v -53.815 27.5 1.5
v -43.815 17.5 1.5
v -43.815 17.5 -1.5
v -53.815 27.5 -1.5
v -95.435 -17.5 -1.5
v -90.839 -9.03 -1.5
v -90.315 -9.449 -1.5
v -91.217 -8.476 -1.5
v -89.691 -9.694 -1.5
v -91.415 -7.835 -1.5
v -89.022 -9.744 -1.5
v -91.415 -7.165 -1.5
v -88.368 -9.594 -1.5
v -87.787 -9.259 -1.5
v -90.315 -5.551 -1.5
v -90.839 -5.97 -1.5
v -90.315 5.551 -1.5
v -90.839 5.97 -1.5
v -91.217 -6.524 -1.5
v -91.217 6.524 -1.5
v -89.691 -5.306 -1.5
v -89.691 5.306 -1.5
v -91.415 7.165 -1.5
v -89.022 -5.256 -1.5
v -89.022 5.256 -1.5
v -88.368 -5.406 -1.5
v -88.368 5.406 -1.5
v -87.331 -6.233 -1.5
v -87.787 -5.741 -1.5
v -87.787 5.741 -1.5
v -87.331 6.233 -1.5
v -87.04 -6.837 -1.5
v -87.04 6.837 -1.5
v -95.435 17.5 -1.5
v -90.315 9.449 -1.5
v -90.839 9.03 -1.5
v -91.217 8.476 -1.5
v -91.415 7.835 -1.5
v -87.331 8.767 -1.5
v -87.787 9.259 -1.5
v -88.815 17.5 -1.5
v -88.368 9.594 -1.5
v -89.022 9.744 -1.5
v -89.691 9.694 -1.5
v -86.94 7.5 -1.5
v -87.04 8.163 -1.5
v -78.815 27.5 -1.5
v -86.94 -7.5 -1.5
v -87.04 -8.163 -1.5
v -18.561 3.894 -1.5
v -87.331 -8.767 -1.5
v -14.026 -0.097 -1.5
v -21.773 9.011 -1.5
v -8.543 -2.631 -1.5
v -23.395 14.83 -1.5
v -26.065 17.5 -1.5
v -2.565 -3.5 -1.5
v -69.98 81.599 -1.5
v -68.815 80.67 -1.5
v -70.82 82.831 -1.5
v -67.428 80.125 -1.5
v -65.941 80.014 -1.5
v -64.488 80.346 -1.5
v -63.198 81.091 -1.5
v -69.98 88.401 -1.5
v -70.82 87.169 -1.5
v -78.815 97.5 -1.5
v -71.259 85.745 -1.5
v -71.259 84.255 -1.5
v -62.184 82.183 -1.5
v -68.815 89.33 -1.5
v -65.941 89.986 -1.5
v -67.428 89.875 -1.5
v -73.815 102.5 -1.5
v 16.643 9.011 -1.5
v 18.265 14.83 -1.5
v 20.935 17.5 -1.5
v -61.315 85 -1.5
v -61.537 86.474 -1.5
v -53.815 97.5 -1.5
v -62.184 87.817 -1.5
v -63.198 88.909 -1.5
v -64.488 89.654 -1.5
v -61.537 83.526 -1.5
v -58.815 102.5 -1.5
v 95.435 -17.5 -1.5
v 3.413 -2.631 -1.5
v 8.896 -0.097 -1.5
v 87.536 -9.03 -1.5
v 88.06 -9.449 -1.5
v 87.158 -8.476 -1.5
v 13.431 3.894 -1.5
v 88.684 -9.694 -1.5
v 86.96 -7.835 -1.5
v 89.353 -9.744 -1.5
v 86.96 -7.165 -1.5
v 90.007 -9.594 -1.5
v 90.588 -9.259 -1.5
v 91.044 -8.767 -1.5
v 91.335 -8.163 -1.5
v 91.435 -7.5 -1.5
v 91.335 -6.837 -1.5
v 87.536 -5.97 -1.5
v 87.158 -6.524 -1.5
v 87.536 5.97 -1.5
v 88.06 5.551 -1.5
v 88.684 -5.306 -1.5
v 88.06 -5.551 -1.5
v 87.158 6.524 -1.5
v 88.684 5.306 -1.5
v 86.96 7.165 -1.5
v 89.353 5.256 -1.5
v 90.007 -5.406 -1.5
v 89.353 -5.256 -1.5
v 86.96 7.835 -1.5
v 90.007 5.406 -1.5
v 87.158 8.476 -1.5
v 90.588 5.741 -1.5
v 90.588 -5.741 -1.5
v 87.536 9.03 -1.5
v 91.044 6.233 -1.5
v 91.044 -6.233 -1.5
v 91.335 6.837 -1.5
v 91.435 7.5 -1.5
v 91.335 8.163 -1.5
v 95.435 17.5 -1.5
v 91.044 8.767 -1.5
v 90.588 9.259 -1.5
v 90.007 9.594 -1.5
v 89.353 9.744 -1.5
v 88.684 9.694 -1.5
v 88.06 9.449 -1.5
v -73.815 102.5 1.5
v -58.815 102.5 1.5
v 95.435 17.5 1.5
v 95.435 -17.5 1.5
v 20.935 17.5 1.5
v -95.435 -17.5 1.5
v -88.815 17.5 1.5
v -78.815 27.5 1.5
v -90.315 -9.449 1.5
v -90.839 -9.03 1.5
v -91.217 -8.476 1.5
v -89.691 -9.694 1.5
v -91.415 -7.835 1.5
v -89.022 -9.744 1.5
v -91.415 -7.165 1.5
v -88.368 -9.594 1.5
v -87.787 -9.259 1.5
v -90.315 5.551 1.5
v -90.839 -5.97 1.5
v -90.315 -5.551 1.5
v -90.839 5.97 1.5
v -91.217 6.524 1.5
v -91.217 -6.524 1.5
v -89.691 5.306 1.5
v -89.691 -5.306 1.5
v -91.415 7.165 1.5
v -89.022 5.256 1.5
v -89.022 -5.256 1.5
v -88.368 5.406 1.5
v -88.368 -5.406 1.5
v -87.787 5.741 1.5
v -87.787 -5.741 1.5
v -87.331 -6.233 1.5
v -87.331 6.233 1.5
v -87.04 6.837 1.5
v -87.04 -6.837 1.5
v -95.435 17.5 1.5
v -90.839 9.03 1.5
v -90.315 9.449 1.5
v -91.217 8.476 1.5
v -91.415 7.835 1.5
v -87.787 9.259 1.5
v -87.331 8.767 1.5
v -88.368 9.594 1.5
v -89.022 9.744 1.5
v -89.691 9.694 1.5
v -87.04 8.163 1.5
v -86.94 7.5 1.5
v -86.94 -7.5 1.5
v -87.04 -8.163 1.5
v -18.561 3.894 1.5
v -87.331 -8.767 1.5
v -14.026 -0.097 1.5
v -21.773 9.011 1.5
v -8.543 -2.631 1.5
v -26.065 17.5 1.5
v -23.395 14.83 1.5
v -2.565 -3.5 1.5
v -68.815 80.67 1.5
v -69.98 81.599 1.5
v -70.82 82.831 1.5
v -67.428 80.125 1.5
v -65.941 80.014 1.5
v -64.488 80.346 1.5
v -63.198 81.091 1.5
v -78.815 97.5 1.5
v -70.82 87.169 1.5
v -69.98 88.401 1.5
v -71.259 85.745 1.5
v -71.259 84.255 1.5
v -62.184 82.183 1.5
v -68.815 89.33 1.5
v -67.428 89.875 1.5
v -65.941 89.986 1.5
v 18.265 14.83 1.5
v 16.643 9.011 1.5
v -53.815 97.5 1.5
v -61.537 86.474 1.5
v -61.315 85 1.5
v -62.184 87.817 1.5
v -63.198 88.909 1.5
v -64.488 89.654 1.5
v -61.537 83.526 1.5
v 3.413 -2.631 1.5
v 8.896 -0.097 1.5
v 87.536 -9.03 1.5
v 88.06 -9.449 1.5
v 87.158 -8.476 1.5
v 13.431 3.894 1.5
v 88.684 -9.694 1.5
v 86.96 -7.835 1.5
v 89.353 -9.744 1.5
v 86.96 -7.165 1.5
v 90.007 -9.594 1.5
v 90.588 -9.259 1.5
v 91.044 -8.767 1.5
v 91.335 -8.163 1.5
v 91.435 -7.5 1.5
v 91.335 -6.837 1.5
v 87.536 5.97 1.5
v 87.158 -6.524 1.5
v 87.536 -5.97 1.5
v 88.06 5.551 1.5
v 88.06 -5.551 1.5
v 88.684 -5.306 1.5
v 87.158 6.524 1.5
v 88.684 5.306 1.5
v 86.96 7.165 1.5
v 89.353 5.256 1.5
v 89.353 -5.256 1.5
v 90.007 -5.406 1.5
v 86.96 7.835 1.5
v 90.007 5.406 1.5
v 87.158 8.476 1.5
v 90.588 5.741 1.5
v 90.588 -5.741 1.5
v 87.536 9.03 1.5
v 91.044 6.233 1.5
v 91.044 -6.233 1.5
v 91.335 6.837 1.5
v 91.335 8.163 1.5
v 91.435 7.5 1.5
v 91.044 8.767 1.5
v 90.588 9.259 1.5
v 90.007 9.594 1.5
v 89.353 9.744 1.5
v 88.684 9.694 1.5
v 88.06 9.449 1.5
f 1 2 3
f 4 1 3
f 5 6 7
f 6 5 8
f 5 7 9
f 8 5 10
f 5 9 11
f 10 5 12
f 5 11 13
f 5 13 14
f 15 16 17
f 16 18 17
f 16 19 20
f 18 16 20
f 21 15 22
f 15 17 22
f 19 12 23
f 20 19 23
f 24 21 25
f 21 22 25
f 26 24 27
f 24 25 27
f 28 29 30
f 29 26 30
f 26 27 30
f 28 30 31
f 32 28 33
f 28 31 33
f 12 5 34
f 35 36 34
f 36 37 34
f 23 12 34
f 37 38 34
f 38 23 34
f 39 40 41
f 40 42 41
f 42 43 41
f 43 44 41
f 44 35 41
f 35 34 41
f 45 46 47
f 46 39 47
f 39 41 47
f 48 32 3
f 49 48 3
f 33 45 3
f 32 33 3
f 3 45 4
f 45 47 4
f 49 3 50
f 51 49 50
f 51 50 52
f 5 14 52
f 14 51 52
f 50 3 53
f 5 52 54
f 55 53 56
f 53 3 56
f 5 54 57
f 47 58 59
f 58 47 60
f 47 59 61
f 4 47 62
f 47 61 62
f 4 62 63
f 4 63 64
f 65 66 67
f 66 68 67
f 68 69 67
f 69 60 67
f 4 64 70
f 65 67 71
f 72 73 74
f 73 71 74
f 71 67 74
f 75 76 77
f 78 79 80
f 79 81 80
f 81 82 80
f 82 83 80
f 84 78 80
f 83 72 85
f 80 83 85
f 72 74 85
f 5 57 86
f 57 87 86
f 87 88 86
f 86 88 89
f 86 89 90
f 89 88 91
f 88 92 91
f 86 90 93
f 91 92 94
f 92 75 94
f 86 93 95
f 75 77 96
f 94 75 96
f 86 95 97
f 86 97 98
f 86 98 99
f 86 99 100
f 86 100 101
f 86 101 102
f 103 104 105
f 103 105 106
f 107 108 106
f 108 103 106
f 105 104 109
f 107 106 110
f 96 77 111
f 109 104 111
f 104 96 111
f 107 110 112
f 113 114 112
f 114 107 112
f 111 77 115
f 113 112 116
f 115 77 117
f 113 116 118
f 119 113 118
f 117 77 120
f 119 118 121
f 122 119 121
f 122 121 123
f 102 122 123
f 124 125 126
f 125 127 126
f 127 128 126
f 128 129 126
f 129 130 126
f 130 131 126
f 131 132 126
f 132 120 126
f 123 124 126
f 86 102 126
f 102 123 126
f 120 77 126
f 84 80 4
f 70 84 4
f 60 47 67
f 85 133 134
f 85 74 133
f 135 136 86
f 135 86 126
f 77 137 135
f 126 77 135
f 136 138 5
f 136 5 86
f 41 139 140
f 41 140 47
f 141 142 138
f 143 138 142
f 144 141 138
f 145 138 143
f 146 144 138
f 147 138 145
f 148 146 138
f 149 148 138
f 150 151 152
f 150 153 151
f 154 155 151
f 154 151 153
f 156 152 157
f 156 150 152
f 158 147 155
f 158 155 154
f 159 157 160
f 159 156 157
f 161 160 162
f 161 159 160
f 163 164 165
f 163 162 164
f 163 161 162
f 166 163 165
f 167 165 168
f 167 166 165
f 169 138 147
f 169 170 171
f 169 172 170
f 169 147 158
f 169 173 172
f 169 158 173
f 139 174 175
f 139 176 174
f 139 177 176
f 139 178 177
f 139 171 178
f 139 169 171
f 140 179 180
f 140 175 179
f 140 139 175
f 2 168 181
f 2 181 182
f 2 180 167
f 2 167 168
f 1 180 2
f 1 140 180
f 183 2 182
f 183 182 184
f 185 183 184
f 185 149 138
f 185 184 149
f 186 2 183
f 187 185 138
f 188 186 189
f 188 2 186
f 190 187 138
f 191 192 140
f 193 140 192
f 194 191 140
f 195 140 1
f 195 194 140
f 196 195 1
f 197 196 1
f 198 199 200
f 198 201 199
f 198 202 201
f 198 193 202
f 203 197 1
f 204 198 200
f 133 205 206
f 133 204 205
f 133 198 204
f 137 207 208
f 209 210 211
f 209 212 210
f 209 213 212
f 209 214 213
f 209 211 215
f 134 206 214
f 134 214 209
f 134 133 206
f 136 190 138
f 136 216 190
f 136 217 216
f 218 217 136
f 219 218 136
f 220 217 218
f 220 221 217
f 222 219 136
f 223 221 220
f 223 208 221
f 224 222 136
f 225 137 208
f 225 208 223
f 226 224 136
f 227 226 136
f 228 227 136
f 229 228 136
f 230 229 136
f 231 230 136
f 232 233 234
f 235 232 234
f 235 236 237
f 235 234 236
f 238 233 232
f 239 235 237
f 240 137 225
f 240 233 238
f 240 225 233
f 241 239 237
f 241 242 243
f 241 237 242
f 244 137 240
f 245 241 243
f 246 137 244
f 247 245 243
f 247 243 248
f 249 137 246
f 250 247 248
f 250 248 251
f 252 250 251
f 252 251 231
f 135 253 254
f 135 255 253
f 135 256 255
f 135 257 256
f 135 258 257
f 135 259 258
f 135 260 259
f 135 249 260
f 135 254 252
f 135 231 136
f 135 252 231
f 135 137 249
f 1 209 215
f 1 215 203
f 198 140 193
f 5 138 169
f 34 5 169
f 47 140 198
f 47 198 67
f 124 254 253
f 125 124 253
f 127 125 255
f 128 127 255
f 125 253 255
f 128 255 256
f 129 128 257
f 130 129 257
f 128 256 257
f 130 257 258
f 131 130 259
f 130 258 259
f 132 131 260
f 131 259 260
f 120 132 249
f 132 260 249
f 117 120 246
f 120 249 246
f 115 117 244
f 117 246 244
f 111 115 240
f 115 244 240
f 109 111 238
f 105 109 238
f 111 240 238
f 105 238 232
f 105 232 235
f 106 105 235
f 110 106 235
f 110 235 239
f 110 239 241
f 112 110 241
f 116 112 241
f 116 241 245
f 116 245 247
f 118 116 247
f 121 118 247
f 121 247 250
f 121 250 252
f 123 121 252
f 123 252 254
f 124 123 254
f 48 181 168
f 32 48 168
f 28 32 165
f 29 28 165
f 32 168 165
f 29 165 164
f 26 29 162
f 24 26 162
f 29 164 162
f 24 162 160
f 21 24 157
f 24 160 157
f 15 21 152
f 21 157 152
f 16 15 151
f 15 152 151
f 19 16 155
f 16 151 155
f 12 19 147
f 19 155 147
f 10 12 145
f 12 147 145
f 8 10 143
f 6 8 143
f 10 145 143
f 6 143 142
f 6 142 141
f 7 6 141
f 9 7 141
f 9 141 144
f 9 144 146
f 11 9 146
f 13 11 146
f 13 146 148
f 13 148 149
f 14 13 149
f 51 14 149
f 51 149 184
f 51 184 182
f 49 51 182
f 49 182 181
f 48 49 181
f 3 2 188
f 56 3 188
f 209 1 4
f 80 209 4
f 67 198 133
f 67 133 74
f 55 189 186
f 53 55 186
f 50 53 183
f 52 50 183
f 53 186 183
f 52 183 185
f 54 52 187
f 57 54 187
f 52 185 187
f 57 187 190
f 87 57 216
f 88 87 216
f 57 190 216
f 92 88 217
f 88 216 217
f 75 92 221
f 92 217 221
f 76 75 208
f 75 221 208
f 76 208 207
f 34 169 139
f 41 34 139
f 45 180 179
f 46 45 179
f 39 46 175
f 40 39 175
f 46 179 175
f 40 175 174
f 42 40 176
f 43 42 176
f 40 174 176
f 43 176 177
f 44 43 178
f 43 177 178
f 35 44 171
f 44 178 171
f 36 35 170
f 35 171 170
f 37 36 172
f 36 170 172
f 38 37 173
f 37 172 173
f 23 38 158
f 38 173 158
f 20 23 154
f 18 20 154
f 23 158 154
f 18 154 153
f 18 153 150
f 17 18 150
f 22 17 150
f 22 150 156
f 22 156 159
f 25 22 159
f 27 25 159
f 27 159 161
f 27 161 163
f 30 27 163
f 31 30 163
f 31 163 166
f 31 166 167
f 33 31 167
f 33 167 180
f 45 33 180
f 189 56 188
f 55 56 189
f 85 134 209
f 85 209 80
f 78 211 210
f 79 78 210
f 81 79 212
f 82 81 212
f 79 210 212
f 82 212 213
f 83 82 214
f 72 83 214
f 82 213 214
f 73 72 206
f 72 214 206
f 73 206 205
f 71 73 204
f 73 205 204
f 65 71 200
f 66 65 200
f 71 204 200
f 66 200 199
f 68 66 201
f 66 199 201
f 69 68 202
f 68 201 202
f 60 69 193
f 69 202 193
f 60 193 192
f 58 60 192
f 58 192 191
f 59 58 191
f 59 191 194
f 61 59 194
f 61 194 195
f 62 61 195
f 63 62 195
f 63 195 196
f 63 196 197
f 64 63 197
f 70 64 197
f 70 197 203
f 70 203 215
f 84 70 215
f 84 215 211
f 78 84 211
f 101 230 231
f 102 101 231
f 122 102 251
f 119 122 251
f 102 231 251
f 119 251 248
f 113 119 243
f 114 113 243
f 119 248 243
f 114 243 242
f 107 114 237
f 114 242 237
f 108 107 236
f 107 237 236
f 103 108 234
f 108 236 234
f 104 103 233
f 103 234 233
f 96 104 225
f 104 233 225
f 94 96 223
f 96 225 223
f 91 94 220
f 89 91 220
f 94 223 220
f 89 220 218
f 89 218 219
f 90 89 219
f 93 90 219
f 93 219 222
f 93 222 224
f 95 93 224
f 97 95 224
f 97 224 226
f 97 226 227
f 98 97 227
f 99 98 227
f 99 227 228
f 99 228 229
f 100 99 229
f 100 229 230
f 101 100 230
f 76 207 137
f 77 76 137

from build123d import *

# Parameters (mm, degrees)
SKETCH1_W            = 190.87
SKETCH1_H            = 35
BOSS_EXTRUDE1_DEPTH  = 1.5
SKETCH2_R            = 21
CUT_EXTRUDE1_DEPTH   = 98.072597704
SKETCH3_W            = 25
SKETCH3_H            = 3
BOSS_EXTRUDE2_DEPTH  = 85
CHAMFER1_SIZE        = 5
CUT_EXTRUDE2_REACH   = 142.082
SKETCH4_R            = 5
CHAMFER2_SIZE        = 10
M4_CLEARANCE_HOLE1_D = 4.5
CHAMFER3_SIZE        = 2.5


with BuildPart() as part:
    # Sketch1 → Boss-Extrude1 (new, symmetric)
    with BuildSketch(Plane.XY):
        Rectangle(SKETCH1_W, SKETCH1_H)
    extrude(amount=BOSS_EXTRUDE1_DEPTH, both=True)

    # Sketch2 → Cut-Extrude1 (cut, through all)
    with BuildSketch(Plane.XY.offset(1.5)):
        with Locations((-2.565, 17.5)):
            Circle(SKETCH2_R)
    extrude(amount=-CUT_EXTRUDE1_DEPTH, mode=Mode.SUBTRACT)

    # Sketch3 → Boss-Extrude2 (add)
    with BuildSketch(Plane(origin=(0, 17.5, 0), x_dir=(1, 0, 0), z_dir=(0, 1, 0))):
        with Locations((-66.315, 0)):
            Rectangle(SKETCH3_W, SKETCH3_H)
    extrude(amount=BOSS_EXTRUDE2_DEPTH)

    # Chamfer1
    chamfer1_edges = [part.edges().sort_by_distance(p)[0] for p in [
        (-53.815, 102.5, 0),
        (-78.815, 102.5, 0),
    ]]
    chamfer(chamfer1_edges, length=CHAMFER1_SIZE)

    # Sketch4 → Cut-Extrude2 (cut, up to next)
    with BuildSketch(Plane.XY.offset(1.5), mode=Mode.PRIVATE) as cut_extrude2_sk1:
        with Locations((-66.315, 85)):
            Circle(SKETCH4_R)
    cut_extrude2_tool1 = extrude(cut_extrude2_sk1.sketch, amount=-CUT_EXTRUDE2_REACH, mode=Mode.PRIVATE) & part.part
    add(cut_extrude2_tool1.solids().sort_by_distance((-66.315, 85, 1.5))[0], mode=Mode.SUBTRACT)

    # Chamfer2
    chamfer2_edges = [part.edges().sort_by_distance(p)[0] for p in [
        (-53.815, 17.5, 0),
        (-78.815, 17.5, 0),
    ]]
    chamfer(chamfer2_edges, length=CHAMFER2_SIZE)

    # M4 Clearance Hole1 (through all)
    with Locations(Plane(origin=(0, 0, -1.5), x_dir=(-1, 0, 0), z_dir=(0, 0, -1))):
        with Locations((-89.185, 7.5), (-89.185, -7.5), (89.19, 7.5), (89.19, -7.5)):
            Hole(M4_CLEARANCE_HOLE1_D / 2)

    # Chamfer3
    # the kernel refuses this chamfer: 2.5 mm, written as the material it takes off along each edge
    with BuildSketch(Plane(origin=(18.435, 17.5, 8.379480144), x_dir=(-0.06371254293281461, -0.9979682920178548, 0), z_dir=(0, 0, -1))) as chamfer3_piece_1:
        with BuildLine():
            Line((2.675926803, 0), (-CHAMFER3_SIZE * 0.0637125429328, -CHAMFER3_SIZE * 0.997968292018))
            Line((-CHAMFER3_SIZE * 0.0637125429328, -CHAMFER3_SIZE * 0.997968292018), (0, 0))
            ThreePointArc((0, 0), (1.375635219, -0.042632078), (2.675926803, 0))
        make_face()
    extrude(amount=16.758960289, mode=Mode.SUBTRACT)
    with BuildSketch(Plane(origin=(-23.565, 17.5, -8.379480144), x_dir=(-1, 0, 0), z_dir=(0, 0, 1))) as chamfer3_piece_2:
        with BuildLine():
            Line((CHAMFER3_SIZE, 0), (-0.170490101, 2.670490101))
            ThreePointArc((-0.170490101, 2.670490101), (-0.045099756, 1.375556528), (0, 0))
            Line((0, 0), (CHAMFER3_SIZE, 0))
        make_face()
    extrude(amount=16.758960289, mode=Mode.SUBTRACT)


solid = part.part
